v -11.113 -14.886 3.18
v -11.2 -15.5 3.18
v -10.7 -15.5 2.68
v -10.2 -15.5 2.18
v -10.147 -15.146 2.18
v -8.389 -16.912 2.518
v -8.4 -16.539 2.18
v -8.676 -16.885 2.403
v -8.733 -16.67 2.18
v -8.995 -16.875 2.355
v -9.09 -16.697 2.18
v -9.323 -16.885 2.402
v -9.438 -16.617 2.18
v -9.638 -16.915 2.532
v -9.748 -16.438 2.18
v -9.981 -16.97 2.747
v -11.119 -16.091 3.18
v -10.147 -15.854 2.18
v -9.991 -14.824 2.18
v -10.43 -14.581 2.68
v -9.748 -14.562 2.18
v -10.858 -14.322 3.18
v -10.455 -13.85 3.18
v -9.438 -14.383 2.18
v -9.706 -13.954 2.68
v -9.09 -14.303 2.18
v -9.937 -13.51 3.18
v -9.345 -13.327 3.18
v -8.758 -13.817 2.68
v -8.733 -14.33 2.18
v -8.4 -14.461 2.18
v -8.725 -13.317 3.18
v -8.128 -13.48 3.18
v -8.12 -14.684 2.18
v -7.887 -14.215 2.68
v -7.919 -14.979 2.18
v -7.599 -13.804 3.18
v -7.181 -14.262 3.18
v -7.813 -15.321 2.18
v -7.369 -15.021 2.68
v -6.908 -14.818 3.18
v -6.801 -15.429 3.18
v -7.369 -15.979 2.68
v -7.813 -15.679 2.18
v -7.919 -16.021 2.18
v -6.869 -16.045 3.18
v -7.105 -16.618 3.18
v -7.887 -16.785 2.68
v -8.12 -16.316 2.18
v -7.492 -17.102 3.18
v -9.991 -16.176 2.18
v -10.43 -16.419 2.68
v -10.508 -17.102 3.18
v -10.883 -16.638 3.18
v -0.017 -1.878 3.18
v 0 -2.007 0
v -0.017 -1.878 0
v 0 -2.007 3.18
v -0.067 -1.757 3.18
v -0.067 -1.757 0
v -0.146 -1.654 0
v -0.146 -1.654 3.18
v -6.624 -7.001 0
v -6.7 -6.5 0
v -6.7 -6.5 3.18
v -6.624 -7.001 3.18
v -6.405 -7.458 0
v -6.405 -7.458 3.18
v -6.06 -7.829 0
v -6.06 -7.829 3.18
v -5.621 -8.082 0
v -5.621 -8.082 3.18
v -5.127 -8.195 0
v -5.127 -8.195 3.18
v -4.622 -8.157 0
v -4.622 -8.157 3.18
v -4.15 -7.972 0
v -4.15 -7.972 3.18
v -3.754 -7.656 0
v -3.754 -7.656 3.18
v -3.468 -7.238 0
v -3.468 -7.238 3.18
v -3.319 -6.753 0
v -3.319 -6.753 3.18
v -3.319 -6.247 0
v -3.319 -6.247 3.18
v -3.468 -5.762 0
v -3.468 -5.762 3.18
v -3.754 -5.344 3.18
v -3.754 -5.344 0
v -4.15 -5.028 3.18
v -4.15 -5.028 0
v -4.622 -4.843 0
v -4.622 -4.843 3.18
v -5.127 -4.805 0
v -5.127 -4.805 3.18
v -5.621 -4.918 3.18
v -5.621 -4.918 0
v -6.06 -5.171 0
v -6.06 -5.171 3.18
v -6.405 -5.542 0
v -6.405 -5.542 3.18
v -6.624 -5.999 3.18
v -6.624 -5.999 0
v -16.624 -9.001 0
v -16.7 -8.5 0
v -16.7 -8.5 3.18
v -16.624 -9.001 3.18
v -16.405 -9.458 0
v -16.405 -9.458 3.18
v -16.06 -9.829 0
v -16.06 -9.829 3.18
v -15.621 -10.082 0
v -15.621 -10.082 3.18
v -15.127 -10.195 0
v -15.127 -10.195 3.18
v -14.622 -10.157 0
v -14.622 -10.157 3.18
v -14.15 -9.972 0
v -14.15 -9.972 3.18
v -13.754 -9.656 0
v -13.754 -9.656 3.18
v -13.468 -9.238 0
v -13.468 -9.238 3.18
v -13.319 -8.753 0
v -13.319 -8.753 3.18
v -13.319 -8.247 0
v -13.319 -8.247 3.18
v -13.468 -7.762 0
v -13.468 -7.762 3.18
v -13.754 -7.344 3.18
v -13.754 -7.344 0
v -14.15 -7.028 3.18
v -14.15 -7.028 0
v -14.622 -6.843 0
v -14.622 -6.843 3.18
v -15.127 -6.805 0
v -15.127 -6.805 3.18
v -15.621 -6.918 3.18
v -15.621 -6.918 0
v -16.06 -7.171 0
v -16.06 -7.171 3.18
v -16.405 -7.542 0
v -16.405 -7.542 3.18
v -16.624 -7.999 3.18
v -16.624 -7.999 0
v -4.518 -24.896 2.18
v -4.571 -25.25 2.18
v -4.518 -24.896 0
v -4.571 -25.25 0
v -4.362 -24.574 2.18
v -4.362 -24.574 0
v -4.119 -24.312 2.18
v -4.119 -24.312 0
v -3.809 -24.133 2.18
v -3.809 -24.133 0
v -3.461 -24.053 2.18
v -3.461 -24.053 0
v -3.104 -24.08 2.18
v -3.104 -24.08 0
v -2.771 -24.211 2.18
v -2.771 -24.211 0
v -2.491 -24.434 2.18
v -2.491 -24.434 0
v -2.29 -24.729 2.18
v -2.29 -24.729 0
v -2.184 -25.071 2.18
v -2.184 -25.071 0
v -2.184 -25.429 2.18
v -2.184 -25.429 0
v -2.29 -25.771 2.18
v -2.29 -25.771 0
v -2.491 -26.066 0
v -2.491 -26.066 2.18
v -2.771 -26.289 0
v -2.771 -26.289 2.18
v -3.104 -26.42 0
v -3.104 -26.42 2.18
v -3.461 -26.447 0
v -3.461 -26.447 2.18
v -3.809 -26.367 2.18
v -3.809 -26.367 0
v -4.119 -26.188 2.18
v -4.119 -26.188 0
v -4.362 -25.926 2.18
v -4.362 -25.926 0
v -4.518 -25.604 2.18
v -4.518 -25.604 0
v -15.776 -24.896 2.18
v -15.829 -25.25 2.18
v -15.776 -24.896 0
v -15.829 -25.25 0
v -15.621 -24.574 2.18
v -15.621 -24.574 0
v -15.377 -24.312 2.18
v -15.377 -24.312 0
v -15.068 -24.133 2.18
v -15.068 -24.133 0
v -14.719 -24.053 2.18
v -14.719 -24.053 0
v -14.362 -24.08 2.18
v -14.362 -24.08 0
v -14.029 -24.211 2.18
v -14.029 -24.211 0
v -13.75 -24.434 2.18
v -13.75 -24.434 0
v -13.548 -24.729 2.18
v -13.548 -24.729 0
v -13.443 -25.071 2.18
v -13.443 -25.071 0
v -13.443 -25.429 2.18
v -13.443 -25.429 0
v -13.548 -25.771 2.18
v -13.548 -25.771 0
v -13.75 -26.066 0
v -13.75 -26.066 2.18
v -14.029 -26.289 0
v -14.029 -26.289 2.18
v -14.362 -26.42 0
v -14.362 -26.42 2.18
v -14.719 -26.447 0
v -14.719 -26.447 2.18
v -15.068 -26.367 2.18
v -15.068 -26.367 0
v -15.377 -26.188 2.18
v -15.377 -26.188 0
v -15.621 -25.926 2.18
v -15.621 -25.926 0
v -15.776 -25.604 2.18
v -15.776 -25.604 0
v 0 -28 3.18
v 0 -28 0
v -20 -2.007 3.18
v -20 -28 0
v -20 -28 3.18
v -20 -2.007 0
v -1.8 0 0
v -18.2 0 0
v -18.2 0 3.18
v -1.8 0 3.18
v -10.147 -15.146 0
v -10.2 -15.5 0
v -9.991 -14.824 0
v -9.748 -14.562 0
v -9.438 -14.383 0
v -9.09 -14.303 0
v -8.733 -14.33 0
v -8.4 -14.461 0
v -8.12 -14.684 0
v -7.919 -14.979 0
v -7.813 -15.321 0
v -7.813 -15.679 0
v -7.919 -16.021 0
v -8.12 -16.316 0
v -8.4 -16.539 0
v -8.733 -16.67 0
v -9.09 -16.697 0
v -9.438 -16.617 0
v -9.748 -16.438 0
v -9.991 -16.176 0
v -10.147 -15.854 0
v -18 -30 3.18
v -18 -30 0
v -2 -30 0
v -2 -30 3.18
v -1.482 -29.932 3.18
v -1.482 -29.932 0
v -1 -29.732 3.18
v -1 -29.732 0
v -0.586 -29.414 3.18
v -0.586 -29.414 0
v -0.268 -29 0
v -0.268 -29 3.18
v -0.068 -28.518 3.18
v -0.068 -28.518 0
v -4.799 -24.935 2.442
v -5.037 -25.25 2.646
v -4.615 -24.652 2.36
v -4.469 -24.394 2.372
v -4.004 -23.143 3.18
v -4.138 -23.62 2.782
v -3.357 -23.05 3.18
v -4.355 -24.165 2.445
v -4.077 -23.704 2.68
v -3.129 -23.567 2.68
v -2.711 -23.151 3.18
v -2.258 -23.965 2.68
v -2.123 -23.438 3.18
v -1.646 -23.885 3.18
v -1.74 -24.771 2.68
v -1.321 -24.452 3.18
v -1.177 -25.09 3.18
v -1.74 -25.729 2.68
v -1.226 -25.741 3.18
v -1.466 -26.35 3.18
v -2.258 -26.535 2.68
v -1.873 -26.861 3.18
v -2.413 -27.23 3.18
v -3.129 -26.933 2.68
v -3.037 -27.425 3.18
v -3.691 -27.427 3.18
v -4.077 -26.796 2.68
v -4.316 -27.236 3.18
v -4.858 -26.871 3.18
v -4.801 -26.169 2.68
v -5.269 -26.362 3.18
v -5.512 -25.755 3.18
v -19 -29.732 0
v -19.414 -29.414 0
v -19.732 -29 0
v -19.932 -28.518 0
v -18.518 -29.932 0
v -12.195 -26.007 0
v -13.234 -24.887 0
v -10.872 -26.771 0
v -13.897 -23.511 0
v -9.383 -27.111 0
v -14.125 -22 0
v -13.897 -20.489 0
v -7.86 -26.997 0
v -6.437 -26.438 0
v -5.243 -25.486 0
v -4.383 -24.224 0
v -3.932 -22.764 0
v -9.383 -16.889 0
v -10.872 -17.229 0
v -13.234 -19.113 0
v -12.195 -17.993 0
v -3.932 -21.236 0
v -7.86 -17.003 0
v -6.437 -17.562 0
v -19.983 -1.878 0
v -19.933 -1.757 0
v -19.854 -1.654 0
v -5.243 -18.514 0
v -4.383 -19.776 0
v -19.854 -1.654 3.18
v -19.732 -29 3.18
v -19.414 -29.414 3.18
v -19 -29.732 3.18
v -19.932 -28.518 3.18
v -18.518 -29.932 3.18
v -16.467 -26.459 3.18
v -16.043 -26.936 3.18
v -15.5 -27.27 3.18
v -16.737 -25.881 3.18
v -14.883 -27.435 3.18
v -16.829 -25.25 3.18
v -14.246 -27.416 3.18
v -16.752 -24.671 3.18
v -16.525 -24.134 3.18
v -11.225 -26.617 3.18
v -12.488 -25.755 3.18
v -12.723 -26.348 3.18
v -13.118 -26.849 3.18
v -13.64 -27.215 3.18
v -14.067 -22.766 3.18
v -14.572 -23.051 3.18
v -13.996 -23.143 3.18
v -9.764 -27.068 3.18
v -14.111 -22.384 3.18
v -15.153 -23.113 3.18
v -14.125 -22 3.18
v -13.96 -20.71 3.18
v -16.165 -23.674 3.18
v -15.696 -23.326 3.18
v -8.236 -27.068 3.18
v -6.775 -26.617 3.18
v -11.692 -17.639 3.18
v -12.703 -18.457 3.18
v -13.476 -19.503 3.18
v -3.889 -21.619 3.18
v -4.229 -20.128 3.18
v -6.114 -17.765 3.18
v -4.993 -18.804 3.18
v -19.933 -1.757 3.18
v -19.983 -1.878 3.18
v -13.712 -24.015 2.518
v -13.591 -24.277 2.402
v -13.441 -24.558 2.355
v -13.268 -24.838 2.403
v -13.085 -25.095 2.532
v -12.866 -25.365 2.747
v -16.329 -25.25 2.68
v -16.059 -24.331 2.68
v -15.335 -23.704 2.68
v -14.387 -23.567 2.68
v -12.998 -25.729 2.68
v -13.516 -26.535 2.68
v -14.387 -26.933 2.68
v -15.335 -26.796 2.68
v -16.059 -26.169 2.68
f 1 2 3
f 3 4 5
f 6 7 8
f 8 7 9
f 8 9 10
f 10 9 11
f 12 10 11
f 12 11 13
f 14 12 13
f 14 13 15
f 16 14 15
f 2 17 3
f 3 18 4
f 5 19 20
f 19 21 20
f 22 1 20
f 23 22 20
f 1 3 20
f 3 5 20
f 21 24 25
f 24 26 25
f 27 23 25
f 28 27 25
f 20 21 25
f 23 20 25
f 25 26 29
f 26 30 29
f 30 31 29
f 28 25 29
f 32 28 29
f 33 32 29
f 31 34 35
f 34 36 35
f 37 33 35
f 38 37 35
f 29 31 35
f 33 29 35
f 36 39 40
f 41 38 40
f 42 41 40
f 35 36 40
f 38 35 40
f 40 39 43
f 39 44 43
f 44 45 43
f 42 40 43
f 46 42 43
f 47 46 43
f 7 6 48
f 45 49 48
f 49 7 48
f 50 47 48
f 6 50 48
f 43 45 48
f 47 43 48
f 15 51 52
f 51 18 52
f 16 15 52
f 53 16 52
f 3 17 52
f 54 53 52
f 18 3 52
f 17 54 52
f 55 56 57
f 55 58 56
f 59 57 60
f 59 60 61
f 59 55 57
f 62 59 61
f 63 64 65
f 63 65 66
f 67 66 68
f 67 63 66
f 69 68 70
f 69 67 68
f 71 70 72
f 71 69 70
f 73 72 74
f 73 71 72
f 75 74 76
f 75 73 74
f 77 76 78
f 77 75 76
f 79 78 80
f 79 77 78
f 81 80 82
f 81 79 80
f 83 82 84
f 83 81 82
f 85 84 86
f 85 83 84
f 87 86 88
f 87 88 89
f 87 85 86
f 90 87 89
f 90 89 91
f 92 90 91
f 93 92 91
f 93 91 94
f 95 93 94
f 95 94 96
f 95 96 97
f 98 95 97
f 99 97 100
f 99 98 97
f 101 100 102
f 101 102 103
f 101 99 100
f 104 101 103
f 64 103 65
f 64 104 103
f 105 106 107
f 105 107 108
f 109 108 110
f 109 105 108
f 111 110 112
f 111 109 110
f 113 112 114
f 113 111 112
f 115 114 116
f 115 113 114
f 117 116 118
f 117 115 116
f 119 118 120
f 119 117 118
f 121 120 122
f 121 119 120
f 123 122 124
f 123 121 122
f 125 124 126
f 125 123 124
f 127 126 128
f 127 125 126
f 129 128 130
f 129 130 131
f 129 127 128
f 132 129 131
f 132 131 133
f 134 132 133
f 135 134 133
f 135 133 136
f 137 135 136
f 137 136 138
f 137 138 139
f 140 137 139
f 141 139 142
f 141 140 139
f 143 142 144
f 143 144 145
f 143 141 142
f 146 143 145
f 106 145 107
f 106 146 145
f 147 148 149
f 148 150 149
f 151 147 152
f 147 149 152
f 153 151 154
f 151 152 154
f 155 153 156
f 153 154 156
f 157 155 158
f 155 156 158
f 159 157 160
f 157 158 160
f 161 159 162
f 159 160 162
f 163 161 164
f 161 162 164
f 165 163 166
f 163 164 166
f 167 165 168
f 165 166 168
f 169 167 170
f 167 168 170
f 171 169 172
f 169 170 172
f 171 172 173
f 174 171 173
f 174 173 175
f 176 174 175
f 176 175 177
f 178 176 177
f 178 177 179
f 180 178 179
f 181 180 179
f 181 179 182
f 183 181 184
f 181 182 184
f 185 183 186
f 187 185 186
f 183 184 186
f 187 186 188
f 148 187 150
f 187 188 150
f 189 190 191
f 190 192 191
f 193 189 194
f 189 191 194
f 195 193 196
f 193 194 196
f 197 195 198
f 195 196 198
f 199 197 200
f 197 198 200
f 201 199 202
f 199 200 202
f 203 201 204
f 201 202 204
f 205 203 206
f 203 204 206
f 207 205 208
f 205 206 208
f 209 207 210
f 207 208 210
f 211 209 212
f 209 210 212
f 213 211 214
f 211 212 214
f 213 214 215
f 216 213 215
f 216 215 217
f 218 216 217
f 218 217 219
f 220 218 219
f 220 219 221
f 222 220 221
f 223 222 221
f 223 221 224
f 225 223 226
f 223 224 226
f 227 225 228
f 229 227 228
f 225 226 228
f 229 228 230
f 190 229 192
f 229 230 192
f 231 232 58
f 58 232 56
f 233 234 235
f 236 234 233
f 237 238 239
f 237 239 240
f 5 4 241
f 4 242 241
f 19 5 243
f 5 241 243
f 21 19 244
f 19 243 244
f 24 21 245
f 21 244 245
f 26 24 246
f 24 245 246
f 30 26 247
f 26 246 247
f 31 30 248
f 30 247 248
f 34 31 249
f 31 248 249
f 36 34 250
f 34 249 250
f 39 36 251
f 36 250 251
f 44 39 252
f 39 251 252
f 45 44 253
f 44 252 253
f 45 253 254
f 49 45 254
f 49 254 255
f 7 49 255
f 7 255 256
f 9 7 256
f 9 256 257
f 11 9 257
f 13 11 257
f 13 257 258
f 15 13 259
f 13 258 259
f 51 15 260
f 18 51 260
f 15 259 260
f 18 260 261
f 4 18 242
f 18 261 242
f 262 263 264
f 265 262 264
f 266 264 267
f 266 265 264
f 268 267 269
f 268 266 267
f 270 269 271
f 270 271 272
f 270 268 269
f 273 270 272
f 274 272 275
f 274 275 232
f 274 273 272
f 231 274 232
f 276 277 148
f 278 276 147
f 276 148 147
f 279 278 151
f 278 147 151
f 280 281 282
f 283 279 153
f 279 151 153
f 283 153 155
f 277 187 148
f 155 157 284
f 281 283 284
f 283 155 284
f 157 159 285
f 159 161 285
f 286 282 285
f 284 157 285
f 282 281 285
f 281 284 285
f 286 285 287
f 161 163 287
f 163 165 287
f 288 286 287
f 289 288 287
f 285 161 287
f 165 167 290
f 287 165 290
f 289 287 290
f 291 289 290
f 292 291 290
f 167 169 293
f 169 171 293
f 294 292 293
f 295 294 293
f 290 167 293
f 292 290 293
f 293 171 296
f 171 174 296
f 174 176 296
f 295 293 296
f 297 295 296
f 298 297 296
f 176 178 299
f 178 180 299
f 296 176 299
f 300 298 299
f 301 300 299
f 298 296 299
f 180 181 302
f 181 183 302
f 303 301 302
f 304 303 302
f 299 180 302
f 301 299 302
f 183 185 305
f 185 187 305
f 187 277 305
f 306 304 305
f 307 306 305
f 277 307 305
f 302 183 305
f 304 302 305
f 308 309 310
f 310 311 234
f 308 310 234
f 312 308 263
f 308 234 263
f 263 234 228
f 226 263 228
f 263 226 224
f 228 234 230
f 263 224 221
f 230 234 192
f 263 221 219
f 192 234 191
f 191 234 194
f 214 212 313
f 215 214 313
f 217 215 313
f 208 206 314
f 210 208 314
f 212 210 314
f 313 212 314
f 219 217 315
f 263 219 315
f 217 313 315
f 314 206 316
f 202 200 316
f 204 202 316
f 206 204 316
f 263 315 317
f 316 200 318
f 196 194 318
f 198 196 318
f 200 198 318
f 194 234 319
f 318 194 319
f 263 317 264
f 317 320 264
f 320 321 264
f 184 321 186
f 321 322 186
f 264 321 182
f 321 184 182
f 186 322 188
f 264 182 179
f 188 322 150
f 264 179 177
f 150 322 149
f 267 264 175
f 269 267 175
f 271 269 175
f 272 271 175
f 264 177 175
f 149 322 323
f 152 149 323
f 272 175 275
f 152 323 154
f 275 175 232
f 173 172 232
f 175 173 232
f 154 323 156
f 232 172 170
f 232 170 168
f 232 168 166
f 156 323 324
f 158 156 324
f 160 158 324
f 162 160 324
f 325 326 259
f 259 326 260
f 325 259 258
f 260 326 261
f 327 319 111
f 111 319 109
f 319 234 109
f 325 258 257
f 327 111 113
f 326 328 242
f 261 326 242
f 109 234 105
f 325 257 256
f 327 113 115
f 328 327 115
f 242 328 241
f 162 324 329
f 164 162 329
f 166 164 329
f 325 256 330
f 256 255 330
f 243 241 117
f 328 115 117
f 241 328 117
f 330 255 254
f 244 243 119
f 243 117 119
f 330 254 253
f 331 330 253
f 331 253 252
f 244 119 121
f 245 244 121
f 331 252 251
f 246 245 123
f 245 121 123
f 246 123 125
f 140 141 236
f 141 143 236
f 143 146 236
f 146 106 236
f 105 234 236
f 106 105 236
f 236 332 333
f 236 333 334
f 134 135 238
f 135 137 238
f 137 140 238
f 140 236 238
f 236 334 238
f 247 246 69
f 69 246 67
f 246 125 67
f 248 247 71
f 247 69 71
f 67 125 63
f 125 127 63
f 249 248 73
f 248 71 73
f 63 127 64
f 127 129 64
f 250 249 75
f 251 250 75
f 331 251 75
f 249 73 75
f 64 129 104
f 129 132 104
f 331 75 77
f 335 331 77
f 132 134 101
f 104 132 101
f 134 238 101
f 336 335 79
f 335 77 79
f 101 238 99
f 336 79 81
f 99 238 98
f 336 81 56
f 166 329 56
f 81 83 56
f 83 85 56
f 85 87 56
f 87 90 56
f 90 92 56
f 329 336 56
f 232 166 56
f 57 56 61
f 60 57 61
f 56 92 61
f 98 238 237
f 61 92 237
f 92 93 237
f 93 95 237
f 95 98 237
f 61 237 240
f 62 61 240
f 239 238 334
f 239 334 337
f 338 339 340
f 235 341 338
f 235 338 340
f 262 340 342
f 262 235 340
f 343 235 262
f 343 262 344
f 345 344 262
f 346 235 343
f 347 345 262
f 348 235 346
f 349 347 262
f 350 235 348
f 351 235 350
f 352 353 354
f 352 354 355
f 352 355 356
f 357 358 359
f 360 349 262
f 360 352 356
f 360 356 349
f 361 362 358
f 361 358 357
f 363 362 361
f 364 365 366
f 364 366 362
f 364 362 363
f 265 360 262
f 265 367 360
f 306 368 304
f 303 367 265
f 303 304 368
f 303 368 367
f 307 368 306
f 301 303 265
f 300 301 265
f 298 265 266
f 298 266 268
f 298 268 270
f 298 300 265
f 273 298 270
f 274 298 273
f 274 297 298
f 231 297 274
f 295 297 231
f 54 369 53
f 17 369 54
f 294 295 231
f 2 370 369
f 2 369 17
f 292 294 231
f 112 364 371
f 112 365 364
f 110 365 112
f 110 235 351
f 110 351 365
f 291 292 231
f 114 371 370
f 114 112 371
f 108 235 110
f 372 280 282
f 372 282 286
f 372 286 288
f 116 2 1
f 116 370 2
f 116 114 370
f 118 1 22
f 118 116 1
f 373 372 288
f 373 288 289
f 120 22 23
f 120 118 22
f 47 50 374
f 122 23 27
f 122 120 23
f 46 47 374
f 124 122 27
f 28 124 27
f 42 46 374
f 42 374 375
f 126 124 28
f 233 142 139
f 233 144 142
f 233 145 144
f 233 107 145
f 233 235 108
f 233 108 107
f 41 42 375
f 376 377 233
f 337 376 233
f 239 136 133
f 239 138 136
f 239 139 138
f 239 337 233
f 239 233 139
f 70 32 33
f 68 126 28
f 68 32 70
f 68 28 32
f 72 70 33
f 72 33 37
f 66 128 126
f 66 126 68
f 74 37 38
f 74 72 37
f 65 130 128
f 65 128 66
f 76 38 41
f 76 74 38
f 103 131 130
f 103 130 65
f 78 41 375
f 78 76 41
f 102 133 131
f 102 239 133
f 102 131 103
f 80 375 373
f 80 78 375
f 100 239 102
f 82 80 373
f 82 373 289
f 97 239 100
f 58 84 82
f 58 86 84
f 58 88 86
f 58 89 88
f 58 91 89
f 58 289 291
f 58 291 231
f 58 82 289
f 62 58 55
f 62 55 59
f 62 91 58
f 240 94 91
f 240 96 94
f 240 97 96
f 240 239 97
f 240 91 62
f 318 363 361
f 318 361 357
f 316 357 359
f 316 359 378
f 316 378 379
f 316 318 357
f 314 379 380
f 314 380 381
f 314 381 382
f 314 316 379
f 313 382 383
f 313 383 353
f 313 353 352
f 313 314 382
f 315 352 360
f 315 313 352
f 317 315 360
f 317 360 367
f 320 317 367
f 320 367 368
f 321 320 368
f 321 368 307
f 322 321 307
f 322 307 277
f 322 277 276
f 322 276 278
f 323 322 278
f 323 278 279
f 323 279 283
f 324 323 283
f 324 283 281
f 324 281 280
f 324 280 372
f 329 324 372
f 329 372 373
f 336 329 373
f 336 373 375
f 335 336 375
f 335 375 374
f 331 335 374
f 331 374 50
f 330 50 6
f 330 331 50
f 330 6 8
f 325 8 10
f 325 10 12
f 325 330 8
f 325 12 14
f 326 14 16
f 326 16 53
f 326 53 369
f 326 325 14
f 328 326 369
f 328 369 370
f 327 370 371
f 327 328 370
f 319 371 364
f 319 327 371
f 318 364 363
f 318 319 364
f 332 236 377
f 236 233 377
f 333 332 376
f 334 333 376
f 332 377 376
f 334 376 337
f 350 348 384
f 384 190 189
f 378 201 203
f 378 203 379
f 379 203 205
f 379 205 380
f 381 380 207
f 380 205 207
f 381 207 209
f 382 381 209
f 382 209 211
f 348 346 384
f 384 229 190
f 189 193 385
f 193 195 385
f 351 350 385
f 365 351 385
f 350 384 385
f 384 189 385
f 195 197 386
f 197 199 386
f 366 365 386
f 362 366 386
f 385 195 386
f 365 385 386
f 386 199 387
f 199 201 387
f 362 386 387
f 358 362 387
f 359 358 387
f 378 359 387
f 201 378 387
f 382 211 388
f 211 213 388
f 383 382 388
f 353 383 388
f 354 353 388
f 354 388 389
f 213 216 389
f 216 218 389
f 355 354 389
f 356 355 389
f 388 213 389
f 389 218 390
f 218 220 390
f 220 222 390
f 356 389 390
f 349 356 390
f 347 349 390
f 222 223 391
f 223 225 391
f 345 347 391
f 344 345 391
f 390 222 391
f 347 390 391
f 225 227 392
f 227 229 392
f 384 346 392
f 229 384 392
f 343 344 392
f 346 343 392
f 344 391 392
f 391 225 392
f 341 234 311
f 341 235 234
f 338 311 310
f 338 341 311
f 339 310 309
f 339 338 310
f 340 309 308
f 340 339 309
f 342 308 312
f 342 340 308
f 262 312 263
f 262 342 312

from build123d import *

# Parameters (mm, degrees)
SKETCH12_W                                      = 20
SKETCH12_H                                      = 30
SKETCH12_R                                      = 5.125
SKETCH12_R_2                                    = 1.7
BOSS_EXTRUDE3_DEPTH                             = 3.18
CSK_FOR_M2_FLAT_HEAD_MACHINE_SCREW2_D           = 2.4
CSK_FOR_M2_FLAT_HEAD_MACHINE_SCREW2_CSINK_D     = 4.4
CSK_FOR_M2_FLAT_HEAD_MACHINE_SCREW2_CSINK_ANGLE = 90
CHAMFER1_SIZE                                   = 1.8
FILLET3_R                                       = 0.5
FILLET4_R                                       = 2


with BuildPart() as part:
    # Sketch12 → Boss-Extrude3 (new body)
    with BuildSketch(Plane.XY):
        with Locations((-10, -15)):
            Rectangle(SKETCH12_W, SKETCH12_H)
        with Locations(Location((-9, -22, 0), (0, 0, 180))):
            Circle(SKETCH12_R, mode=Mode.SUBTRACT)
        with Locations(Location((-5, -6.5, 0), (0, 0, 180))):
            Circle(SKETCH12_R_2, mode=Mode.SUBTRACT)
        with Locations(Location((-15, -8.5, 0), (0, 0, 180))):
            Circle(SKETCH12_R_2, mode=Mode.SUBTRACT)
    extrude(amount=BOSS_EXTRUDE3_DEPTH)

    # CSK for M2 Flat Head Machine Screw2 (through all)
    with Locations(Plane.XY.offset(3.18)):
        with Locations((-9, -15.5), (-14.629165125, -25.25), (-3.370834875, -25.25)):
            CounterSinkHole(CSK_FOR_M2_FLAT_HEAD_MACHINE_SCREW2_D / 2, CSK_FOR_M2_FLAT_HEAD_MACHINE_SCREW2_CSINK_D / 2, counter_sink_angle=CSK_FOR_M2_FLAT_HEAD_MACHINE_SCREW2_CSINK_ANGLE)

    # Chamfer1
    chamfer1_edges = [part.edges().sort_by_distance(p)[0] for p in [
        (-20, 0, 1.59),
        (0, 0, 1.59),
    ]]
    chamfer(chamfer1_edges, length=CHAMFER1_SIZE)

    # Fillet3
    fillet3_edges = [part.edges().sort_by_distance(p)[0] for p in [
        (-20, -1.8, 1.59),
        (0, -1.8, 1.59),
    ]]
    fillet(fillet3_edges, radius=FILLET3_R)

    # Fillet4
    fillet4_edges = [part.edges().sort_by_distance(p)[0] for p in [
        (0, -30, 1.59),
        (-20, -30, 1.59),
    ]]
    fillet(fillet4_edges, radius=FILLET4_R)


solid = part.part
